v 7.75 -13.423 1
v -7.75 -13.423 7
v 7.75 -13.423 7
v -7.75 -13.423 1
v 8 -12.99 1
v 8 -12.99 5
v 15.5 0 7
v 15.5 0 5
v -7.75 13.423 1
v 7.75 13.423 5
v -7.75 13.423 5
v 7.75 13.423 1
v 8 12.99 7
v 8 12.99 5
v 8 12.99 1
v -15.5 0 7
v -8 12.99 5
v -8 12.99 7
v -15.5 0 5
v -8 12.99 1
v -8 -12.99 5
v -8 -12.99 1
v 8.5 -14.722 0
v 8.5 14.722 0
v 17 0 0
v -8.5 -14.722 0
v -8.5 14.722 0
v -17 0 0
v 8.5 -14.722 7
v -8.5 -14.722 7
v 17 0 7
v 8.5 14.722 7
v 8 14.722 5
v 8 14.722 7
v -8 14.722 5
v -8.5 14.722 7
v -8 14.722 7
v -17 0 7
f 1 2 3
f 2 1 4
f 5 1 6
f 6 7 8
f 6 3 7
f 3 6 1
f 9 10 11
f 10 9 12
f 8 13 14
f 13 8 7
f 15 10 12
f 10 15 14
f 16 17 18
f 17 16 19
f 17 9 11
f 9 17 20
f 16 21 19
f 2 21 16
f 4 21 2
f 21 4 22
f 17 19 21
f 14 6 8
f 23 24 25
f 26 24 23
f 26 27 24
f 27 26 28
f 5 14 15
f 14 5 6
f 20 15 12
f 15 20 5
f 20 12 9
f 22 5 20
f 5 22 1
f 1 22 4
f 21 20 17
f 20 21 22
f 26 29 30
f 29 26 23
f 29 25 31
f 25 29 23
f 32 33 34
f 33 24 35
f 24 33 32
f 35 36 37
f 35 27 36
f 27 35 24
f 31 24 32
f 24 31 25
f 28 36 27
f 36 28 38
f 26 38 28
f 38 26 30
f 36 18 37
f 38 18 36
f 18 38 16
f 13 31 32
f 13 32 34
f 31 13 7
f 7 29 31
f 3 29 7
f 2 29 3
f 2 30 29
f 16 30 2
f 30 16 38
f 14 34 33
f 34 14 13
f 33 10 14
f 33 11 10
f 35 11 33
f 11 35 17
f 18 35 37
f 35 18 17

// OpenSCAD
$fn = 90;

module hexbase() {


    difference() {
	cylinder( d = 31, h = 5, $fn = 6 );
	translate( [ -8, -15, 1 ] ) cube( [ 16, 30, 6 ] );
    }

    difference() {
	cylinder( d = 34, h = 7, $fn = 6 );
	translate( [ 0, 0, -.5 ] ) cylinder( d = 31, h = 8, $fn = 6 );
	translate( [ -8, 0, 5 ] ) cube( [ 16, 15, 8 ] );
    }

}

difference() {
    hexbase();
}
